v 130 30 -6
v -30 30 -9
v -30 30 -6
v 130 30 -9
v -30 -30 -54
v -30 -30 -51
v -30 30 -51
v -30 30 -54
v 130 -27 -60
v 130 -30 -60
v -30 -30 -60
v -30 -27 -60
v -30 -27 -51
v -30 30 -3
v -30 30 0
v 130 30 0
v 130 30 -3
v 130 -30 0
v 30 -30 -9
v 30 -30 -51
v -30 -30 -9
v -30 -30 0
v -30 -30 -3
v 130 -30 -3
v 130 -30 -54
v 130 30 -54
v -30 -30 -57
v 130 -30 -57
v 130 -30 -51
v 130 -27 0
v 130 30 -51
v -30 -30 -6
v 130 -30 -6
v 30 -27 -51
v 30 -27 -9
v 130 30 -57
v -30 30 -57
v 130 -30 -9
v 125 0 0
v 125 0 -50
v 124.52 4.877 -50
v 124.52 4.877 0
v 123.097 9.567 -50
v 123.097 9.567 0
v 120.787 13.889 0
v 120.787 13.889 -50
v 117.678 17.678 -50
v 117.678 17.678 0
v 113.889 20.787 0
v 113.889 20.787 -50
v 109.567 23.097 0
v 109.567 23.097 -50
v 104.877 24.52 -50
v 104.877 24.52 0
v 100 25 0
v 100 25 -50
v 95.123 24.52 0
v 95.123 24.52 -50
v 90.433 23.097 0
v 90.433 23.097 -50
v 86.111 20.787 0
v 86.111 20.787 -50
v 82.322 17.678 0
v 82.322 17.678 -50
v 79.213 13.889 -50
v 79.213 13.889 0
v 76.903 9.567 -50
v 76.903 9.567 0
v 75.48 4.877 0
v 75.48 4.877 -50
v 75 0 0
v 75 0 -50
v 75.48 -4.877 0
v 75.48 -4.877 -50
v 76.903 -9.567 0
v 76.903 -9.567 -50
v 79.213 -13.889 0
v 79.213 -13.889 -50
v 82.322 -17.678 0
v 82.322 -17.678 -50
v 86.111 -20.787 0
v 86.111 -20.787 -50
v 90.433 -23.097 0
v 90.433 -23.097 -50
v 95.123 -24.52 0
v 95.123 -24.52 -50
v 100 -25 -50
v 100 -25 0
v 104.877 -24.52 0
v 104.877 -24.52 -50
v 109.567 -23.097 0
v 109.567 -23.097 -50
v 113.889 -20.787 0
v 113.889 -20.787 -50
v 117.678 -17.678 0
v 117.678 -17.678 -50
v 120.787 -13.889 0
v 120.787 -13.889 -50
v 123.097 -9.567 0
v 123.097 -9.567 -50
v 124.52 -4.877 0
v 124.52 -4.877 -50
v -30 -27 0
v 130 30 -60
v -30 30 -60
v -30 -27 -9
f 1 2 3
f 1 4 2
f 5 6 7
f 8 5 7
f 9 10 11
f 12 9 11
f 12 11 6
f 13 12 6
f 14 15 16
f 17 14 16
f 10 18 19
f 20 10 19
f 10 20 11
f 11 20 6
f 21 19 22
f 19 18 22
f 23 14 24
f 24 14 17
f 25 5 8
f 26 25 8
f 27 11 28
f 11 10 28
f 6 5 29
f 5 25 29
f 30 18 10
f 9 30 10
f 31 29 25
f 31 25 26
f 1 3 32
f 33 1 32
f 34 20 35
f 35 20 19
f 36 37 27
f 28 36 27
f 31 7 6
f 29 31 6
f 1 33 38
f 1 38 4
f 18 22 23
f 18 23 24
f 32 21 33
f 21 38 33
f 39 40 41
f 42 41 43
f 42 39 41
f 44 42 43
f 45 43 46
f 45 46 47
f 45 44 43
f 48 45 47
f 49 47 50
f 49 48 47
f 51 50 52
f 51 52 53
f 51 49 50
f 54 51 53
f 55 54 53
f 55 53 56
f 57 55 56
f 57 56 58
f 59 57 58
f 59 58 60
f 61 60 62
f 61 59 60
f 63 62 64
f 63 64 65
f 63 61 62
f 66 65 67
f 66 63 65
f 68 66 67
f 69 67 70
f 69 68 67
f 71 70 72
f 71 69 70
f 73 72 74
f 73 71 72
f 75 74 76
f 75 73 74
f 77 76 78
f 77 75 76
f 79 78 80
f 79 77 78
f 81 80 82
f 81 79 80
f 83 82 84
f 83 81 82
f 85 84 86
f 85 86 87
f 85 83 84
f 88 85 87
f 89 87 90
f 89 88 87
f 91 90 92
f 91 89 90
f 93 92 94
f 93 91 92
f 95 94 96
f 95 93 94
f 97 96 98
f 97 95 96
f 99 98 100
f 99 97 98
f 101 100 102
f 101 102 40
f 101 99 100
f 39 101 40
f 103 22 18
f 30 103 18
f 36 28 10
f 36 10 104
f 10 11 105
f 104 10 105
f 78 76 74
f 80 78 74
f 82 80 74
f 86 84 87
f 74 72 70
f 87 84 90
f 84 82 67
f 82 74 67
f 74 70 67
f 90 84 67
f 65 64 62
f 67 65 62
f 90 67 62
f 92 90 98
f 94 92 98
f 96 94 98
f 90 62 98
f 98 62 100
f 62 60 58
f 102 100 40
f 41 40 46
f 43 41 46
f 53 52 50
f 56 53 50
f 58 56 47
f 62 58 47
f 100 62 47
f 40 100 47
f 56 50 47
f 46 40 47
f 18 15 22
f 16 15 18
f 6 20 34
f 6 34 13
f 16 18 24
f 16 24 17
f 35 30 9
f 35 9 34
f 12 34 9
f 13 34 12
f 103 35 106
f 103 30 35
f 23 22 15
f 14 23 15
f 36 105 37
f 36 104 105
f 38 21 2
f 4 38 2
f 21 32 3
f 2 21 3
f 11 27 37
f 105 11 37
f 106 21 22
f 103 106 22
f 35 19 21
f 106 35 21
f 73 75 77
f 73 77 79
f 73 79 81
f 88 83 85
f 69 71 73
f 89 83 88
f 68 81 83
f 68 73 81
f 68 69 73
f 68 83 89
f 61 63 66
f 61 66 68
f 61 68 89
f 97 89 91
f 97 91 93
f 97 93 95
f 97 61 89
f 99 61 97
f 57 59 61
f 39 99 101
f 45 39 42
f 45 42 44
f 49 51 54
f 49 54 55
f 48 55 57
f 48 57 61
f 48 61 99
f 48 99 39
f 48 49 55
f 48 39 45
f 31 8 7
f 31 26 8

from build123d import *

# Parameters (mm, degrees)
F3_R           = 25
F12_DEPTH      = 50
F9_W           = 160
F9_H           = 60
F13_DEPTH      = 3
F7_W           = 54
F7_H           = 3
F7_W_2         = 3
F14_DEPTH      = 100
F14_DEPTH_BACK = 60
F15_DEPTH      = 100
F15_DEPTH_BACK = 60
F16_DEPTH      = 100
F16_DEPTH_BACK = 60
F11_W          = 60
F11_H          = 9
F17_DEPTH      = 3


with BuildPart() as f12:
    # F3 (on Top) → F12 (new body)
    with BuildSketch(Plane.XY):
        with Locations((100, 0)):
            Circle(F3_R)
    extrude(amount=-F12_DEPTH)


with BuildPart() as f13:
    # F9 (on Top) → F13 (new body)
    with BuildSketch(Plane.XY):
        with Locations((50, 0)):
            Rectangle(F9_W, F9_H)
    extrude(amount=-F13_DEPTH)


with BuildPart() as f14:
    # F7 (on line) → F14 (new body, two sides)
    with BuildSketch(Plane.YZ.offset(30)) as f14_sk:
        with Locations((0, -7.5)):
            Rectangle(F7_W, F7_H)
        with Locations((28.5, -7.5)):
            Rectangle(F7_W_2, F7_H)
        with Locations((-28.5, -7.5)):
            Rectangle(F7_W_2, F7_H)
    extrude(amount=F14_DEPTH)
    extrude(f14_sk.sketch, amount=-F14_DEPTH_BACK)


with BuildPart() as f15:
    # F7 (on line) → F15 (new body, two sides)
    with BuildSketch(Plane.YZ.offset(30)) as f15_sk:
        with Locations((0, -52.5)):
            Rectangle(F7_W, F7_H)
        with Locations((28.5, -52.5)):
            Rectangle(F7_W_2, F7_H)
        with Locations((-28.5, -52.5)):
            Rectangle(F7_W_2, F7_H)
    extrude(amount=F15_DEPTH)
    extrude(f15_sk.sketch, amount=-F15_DEPTH_BACK)


with BuildPart() as f16:
    # F7 (on line) → F16 (new body, two sides)
    with BuildSketch(Plane.YZ.offset(30)) as f16_sk:
        with Locations((0, -58.5)):
            Rectangle(F7_W, F7_H)
        with Locations((28.5, -58.5)):
            Rectangle(F7_W_2, F7_H)
        with Locations((-28.5, -58.5)):
            Rectangle(F7_W_2, F7_H)
    extrude(amount=F16_DEPTH)
    extrude(f16_sk.sketch, amount=-F16_DEPTH_BACK)


with BuildPart() as f17:
    # F11 (on line) → F17 (new body)
    with BuildSketch(Plane(origin=(0, -30, 0), x_dir=(-1, 0, 0), z_dir=(0, 1, 0))):
        Polygon((-30, -9), (-30, 0), (-130, 0), (-130, -60), (-30, -60), (-30, -51), align=None)
        with Locations((0, -4.5)):
            Rectangle(F11_W, F11_H)
        with Locations((0, -55.5)):
            Rectangle(F11_W, F11_H)
    extrude(amount=F17_DEPTH)


solid = Compound([f12.part, f13.part, f14.part, f15.part, f16.part, f17.part])
